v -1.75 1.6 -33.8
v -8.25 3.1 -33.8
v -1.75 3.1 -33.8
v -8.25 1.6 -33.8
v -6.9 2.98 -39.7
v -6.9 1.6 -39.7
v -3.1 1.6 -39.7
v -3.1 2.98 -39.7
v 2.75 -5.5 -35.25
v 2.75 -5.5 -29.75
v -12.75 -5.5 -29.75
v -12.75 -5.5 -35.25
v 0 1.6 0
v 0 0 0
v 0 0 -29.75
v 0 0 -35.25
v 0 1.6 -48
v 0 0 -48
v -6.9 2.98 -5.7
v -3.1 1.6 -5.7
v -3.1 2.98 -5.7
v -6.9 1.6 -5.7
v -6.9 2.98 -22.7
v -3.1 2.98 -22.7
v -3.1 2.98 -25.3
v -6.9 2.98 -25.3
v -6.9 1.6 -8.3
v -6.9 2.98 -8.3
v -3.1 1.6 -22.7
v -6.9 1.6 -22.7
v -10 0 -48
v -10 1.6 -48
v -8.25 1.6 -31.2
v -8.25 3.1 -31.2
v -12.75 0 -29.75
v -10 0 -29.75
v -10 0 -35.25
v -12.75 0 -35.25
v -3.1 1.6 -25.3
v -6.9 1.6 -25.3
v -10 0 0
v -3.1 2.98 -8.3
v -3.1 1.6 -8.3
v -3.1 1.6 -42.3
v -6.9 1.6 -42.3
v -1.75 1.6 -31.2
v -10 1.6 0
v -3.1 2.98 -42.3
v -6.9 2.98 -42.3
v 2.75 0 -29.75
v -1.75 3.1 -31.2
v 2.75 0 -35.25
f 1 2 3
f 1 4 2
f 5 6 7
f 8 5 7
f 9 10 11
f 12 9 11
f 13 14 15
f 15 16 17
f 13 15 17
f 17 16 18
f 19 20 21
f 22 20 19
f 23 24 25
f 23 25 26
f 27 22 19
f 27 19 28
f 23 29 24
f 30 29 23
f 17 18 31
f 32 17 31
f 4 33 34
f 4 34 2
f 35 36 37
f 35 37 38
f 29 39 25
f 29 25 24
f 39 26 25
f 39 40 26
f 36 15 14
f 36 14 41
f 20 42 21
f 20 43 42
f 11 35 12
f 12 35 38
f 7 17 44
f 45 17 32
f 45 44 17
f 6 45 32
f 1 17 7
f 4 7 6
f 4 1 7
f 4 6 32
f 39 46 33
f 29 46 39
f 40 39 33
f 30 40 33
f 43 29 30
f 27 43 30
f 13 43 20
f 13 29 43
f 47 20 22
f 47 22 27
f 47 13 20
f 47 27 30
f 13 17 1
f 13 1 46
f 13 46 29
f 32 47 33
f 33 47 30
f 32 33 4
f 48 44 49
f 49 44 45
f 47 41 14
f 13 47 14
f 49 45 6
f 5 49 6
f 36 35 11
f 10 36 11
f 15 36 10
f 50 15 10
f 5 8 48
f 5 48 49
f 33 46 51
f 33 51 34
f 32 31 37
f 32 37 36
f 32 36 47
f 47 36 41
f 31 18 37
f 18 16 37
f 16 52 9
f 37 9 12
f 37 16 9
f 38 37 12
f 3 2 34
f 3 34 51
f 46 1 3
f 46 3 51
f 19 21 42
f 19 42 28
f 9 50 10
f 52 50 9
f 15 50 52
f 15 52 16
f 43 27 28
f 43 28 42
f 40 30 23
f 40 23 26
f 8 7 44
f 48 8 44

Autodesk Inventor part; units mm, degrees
ref_plane "YZ Plane" through (0, 0, 0) normal (1, 0, 0) x (0, 1, 0)
ref_plane "XZ Plane" through (0, 0, 0) normal (0, 1, 0) x (-1, 0, 0)
ref_plane "XY Plane" through (0, 0, 0) normal (0, 0, 1) x (1, 0, 0)
sketch "Sketch2" plane through (0, 0, 0) normal (0, 1, 0) x (-1, 0, 0)
  line L0 (10, 0) -> (0, 0)
  line L1 (0, 0) -> (0, -48)
  line L2 (0, -48) -> (10, -48)
  line L3 (10, -48) -> (10, 0)
  line L4 (6.9, -8.3) -> (3.1, -8.3)
  line L5 (3.1, -8.3) -> (3.1, -5.7)
  line L6 (3.1, -5.7) -> (6.9, -5.7)
  line L7 (6.9, -5.7) -> (6.9, -8.3)
  line L8 (6.9, -39.7) -> (3.1, -39.7)
  line L9 (3.1, -39.7) -> (3.1, -42.3)
  line L10 (3.1, -42.3) -> (6.9, -42.3)
  line L11 (6.9, -42.3) -> (6.9, -39.7)
  line L12 (3.1, -22.7) -> (6.9, -22.7)
  line L13 (3.1, -25.3) -> (3.1, -22.7)
  line L14 (6.9, -25.3) -> (3.1, -25.3)
  line L15 (6.9, -22.7) -> (6.9, -25.3)
  line L16 (23.6892, -32.5) -> (-2.3247, -32.5) construction
  line L17 (5, -54.7987) -> (5, -48.1542) construction
  line L18 (5, 9.3713) -> (5, -46.1174) construction
  line L19 (11.7769, -7) -> (1.25, -7) construction
  line L20 (11.7769, -24) -> (1.25, -24) construction
  line L21 (11.7769, -41) -> (1.25, -41) construction
  line L22 (12.75, -29.75) -> (-2.75, -29.75)
  line L23 (-2.75, -35.25) -> (12.75, -35.25)
  line L24 (12.75, -29.75) -> (12.75, -35.25)
  line L25 (-2.75, -29.75) -> (-2.75, -35.25)
  dimension "d0" = 10
  dimension "d1" = 48
  dimension "d13" = 3.8
  dimension "d14" = 2.6
  dimension "d40" = 5
  dimension "d49" = 15.5
  dimension "d50" = 7
  dimension "d51" = 24
  dimension "d52" = 41
  dimension "d53" = 5.5
  dimension "d54" = 15.5
extrude "Extrusion1" add sketch "Sketch2" along normal blind 1.6 contours L3 L22 L1 L0 | L3 L23 L1 L22 | L3 L2 L1 L23 | L4 L5 L6 L7 | L11 L10 L9 L8 | L12 L15 L14 L13
extrude "Extrusion4" add sketch "Sketch2" along normal blind 2.98 contours L4 L5 L6 L7 | L11 L10 L9 L8 | L12 L15 L14 L13
sketch "Sketch3" plane through (0, 2.98, 0) normal (0, 1, 0) x (1, 0, 0)
  line L0 (-3.1, 25.3) -> (-6.9, 25.3) construction
  line L1 (-6.9, 22.7) -> (-3.1, 22.7) construction
  point P0 (0, 0)
  point P1 (-5.1459, 24.0493)
extrude "Extrusion5" add sketch "Sketch2" against normal blind 5.5 contours L22 L24 L23 L3 | L3 L23 L1 L22 | L1 L23 L25 L22
sketch "Sketch4" plane through (0, 1.6, 0) normal (0, 1, 0) x (1, 0, 0)
  line L0 (-1.75, 31.2) -> (-8.25, 31.2)
  line L1 (-8.25, 31.2) -> (-8.25, 33.8)
  line L2 (-8.25, 33.8) -> (-1.75, 33.8)
  line L3 (-1.75, 33.8) -> (-1.75, 31.2)
  line L4 (-23.6892, 32.5) -> (2.3247, 32.5) construction
  line L5 (-5, -9.3713) -> (-5, 46.1174) construction
  point P0 (0, 0)
  dimension "d57" = 2.6
  dimension "d58" = 6.5
extrude "Extrusion6" add sketch "Sketch4" along normal blind 1.5
properties part number "Sensor_Board_dummy"
